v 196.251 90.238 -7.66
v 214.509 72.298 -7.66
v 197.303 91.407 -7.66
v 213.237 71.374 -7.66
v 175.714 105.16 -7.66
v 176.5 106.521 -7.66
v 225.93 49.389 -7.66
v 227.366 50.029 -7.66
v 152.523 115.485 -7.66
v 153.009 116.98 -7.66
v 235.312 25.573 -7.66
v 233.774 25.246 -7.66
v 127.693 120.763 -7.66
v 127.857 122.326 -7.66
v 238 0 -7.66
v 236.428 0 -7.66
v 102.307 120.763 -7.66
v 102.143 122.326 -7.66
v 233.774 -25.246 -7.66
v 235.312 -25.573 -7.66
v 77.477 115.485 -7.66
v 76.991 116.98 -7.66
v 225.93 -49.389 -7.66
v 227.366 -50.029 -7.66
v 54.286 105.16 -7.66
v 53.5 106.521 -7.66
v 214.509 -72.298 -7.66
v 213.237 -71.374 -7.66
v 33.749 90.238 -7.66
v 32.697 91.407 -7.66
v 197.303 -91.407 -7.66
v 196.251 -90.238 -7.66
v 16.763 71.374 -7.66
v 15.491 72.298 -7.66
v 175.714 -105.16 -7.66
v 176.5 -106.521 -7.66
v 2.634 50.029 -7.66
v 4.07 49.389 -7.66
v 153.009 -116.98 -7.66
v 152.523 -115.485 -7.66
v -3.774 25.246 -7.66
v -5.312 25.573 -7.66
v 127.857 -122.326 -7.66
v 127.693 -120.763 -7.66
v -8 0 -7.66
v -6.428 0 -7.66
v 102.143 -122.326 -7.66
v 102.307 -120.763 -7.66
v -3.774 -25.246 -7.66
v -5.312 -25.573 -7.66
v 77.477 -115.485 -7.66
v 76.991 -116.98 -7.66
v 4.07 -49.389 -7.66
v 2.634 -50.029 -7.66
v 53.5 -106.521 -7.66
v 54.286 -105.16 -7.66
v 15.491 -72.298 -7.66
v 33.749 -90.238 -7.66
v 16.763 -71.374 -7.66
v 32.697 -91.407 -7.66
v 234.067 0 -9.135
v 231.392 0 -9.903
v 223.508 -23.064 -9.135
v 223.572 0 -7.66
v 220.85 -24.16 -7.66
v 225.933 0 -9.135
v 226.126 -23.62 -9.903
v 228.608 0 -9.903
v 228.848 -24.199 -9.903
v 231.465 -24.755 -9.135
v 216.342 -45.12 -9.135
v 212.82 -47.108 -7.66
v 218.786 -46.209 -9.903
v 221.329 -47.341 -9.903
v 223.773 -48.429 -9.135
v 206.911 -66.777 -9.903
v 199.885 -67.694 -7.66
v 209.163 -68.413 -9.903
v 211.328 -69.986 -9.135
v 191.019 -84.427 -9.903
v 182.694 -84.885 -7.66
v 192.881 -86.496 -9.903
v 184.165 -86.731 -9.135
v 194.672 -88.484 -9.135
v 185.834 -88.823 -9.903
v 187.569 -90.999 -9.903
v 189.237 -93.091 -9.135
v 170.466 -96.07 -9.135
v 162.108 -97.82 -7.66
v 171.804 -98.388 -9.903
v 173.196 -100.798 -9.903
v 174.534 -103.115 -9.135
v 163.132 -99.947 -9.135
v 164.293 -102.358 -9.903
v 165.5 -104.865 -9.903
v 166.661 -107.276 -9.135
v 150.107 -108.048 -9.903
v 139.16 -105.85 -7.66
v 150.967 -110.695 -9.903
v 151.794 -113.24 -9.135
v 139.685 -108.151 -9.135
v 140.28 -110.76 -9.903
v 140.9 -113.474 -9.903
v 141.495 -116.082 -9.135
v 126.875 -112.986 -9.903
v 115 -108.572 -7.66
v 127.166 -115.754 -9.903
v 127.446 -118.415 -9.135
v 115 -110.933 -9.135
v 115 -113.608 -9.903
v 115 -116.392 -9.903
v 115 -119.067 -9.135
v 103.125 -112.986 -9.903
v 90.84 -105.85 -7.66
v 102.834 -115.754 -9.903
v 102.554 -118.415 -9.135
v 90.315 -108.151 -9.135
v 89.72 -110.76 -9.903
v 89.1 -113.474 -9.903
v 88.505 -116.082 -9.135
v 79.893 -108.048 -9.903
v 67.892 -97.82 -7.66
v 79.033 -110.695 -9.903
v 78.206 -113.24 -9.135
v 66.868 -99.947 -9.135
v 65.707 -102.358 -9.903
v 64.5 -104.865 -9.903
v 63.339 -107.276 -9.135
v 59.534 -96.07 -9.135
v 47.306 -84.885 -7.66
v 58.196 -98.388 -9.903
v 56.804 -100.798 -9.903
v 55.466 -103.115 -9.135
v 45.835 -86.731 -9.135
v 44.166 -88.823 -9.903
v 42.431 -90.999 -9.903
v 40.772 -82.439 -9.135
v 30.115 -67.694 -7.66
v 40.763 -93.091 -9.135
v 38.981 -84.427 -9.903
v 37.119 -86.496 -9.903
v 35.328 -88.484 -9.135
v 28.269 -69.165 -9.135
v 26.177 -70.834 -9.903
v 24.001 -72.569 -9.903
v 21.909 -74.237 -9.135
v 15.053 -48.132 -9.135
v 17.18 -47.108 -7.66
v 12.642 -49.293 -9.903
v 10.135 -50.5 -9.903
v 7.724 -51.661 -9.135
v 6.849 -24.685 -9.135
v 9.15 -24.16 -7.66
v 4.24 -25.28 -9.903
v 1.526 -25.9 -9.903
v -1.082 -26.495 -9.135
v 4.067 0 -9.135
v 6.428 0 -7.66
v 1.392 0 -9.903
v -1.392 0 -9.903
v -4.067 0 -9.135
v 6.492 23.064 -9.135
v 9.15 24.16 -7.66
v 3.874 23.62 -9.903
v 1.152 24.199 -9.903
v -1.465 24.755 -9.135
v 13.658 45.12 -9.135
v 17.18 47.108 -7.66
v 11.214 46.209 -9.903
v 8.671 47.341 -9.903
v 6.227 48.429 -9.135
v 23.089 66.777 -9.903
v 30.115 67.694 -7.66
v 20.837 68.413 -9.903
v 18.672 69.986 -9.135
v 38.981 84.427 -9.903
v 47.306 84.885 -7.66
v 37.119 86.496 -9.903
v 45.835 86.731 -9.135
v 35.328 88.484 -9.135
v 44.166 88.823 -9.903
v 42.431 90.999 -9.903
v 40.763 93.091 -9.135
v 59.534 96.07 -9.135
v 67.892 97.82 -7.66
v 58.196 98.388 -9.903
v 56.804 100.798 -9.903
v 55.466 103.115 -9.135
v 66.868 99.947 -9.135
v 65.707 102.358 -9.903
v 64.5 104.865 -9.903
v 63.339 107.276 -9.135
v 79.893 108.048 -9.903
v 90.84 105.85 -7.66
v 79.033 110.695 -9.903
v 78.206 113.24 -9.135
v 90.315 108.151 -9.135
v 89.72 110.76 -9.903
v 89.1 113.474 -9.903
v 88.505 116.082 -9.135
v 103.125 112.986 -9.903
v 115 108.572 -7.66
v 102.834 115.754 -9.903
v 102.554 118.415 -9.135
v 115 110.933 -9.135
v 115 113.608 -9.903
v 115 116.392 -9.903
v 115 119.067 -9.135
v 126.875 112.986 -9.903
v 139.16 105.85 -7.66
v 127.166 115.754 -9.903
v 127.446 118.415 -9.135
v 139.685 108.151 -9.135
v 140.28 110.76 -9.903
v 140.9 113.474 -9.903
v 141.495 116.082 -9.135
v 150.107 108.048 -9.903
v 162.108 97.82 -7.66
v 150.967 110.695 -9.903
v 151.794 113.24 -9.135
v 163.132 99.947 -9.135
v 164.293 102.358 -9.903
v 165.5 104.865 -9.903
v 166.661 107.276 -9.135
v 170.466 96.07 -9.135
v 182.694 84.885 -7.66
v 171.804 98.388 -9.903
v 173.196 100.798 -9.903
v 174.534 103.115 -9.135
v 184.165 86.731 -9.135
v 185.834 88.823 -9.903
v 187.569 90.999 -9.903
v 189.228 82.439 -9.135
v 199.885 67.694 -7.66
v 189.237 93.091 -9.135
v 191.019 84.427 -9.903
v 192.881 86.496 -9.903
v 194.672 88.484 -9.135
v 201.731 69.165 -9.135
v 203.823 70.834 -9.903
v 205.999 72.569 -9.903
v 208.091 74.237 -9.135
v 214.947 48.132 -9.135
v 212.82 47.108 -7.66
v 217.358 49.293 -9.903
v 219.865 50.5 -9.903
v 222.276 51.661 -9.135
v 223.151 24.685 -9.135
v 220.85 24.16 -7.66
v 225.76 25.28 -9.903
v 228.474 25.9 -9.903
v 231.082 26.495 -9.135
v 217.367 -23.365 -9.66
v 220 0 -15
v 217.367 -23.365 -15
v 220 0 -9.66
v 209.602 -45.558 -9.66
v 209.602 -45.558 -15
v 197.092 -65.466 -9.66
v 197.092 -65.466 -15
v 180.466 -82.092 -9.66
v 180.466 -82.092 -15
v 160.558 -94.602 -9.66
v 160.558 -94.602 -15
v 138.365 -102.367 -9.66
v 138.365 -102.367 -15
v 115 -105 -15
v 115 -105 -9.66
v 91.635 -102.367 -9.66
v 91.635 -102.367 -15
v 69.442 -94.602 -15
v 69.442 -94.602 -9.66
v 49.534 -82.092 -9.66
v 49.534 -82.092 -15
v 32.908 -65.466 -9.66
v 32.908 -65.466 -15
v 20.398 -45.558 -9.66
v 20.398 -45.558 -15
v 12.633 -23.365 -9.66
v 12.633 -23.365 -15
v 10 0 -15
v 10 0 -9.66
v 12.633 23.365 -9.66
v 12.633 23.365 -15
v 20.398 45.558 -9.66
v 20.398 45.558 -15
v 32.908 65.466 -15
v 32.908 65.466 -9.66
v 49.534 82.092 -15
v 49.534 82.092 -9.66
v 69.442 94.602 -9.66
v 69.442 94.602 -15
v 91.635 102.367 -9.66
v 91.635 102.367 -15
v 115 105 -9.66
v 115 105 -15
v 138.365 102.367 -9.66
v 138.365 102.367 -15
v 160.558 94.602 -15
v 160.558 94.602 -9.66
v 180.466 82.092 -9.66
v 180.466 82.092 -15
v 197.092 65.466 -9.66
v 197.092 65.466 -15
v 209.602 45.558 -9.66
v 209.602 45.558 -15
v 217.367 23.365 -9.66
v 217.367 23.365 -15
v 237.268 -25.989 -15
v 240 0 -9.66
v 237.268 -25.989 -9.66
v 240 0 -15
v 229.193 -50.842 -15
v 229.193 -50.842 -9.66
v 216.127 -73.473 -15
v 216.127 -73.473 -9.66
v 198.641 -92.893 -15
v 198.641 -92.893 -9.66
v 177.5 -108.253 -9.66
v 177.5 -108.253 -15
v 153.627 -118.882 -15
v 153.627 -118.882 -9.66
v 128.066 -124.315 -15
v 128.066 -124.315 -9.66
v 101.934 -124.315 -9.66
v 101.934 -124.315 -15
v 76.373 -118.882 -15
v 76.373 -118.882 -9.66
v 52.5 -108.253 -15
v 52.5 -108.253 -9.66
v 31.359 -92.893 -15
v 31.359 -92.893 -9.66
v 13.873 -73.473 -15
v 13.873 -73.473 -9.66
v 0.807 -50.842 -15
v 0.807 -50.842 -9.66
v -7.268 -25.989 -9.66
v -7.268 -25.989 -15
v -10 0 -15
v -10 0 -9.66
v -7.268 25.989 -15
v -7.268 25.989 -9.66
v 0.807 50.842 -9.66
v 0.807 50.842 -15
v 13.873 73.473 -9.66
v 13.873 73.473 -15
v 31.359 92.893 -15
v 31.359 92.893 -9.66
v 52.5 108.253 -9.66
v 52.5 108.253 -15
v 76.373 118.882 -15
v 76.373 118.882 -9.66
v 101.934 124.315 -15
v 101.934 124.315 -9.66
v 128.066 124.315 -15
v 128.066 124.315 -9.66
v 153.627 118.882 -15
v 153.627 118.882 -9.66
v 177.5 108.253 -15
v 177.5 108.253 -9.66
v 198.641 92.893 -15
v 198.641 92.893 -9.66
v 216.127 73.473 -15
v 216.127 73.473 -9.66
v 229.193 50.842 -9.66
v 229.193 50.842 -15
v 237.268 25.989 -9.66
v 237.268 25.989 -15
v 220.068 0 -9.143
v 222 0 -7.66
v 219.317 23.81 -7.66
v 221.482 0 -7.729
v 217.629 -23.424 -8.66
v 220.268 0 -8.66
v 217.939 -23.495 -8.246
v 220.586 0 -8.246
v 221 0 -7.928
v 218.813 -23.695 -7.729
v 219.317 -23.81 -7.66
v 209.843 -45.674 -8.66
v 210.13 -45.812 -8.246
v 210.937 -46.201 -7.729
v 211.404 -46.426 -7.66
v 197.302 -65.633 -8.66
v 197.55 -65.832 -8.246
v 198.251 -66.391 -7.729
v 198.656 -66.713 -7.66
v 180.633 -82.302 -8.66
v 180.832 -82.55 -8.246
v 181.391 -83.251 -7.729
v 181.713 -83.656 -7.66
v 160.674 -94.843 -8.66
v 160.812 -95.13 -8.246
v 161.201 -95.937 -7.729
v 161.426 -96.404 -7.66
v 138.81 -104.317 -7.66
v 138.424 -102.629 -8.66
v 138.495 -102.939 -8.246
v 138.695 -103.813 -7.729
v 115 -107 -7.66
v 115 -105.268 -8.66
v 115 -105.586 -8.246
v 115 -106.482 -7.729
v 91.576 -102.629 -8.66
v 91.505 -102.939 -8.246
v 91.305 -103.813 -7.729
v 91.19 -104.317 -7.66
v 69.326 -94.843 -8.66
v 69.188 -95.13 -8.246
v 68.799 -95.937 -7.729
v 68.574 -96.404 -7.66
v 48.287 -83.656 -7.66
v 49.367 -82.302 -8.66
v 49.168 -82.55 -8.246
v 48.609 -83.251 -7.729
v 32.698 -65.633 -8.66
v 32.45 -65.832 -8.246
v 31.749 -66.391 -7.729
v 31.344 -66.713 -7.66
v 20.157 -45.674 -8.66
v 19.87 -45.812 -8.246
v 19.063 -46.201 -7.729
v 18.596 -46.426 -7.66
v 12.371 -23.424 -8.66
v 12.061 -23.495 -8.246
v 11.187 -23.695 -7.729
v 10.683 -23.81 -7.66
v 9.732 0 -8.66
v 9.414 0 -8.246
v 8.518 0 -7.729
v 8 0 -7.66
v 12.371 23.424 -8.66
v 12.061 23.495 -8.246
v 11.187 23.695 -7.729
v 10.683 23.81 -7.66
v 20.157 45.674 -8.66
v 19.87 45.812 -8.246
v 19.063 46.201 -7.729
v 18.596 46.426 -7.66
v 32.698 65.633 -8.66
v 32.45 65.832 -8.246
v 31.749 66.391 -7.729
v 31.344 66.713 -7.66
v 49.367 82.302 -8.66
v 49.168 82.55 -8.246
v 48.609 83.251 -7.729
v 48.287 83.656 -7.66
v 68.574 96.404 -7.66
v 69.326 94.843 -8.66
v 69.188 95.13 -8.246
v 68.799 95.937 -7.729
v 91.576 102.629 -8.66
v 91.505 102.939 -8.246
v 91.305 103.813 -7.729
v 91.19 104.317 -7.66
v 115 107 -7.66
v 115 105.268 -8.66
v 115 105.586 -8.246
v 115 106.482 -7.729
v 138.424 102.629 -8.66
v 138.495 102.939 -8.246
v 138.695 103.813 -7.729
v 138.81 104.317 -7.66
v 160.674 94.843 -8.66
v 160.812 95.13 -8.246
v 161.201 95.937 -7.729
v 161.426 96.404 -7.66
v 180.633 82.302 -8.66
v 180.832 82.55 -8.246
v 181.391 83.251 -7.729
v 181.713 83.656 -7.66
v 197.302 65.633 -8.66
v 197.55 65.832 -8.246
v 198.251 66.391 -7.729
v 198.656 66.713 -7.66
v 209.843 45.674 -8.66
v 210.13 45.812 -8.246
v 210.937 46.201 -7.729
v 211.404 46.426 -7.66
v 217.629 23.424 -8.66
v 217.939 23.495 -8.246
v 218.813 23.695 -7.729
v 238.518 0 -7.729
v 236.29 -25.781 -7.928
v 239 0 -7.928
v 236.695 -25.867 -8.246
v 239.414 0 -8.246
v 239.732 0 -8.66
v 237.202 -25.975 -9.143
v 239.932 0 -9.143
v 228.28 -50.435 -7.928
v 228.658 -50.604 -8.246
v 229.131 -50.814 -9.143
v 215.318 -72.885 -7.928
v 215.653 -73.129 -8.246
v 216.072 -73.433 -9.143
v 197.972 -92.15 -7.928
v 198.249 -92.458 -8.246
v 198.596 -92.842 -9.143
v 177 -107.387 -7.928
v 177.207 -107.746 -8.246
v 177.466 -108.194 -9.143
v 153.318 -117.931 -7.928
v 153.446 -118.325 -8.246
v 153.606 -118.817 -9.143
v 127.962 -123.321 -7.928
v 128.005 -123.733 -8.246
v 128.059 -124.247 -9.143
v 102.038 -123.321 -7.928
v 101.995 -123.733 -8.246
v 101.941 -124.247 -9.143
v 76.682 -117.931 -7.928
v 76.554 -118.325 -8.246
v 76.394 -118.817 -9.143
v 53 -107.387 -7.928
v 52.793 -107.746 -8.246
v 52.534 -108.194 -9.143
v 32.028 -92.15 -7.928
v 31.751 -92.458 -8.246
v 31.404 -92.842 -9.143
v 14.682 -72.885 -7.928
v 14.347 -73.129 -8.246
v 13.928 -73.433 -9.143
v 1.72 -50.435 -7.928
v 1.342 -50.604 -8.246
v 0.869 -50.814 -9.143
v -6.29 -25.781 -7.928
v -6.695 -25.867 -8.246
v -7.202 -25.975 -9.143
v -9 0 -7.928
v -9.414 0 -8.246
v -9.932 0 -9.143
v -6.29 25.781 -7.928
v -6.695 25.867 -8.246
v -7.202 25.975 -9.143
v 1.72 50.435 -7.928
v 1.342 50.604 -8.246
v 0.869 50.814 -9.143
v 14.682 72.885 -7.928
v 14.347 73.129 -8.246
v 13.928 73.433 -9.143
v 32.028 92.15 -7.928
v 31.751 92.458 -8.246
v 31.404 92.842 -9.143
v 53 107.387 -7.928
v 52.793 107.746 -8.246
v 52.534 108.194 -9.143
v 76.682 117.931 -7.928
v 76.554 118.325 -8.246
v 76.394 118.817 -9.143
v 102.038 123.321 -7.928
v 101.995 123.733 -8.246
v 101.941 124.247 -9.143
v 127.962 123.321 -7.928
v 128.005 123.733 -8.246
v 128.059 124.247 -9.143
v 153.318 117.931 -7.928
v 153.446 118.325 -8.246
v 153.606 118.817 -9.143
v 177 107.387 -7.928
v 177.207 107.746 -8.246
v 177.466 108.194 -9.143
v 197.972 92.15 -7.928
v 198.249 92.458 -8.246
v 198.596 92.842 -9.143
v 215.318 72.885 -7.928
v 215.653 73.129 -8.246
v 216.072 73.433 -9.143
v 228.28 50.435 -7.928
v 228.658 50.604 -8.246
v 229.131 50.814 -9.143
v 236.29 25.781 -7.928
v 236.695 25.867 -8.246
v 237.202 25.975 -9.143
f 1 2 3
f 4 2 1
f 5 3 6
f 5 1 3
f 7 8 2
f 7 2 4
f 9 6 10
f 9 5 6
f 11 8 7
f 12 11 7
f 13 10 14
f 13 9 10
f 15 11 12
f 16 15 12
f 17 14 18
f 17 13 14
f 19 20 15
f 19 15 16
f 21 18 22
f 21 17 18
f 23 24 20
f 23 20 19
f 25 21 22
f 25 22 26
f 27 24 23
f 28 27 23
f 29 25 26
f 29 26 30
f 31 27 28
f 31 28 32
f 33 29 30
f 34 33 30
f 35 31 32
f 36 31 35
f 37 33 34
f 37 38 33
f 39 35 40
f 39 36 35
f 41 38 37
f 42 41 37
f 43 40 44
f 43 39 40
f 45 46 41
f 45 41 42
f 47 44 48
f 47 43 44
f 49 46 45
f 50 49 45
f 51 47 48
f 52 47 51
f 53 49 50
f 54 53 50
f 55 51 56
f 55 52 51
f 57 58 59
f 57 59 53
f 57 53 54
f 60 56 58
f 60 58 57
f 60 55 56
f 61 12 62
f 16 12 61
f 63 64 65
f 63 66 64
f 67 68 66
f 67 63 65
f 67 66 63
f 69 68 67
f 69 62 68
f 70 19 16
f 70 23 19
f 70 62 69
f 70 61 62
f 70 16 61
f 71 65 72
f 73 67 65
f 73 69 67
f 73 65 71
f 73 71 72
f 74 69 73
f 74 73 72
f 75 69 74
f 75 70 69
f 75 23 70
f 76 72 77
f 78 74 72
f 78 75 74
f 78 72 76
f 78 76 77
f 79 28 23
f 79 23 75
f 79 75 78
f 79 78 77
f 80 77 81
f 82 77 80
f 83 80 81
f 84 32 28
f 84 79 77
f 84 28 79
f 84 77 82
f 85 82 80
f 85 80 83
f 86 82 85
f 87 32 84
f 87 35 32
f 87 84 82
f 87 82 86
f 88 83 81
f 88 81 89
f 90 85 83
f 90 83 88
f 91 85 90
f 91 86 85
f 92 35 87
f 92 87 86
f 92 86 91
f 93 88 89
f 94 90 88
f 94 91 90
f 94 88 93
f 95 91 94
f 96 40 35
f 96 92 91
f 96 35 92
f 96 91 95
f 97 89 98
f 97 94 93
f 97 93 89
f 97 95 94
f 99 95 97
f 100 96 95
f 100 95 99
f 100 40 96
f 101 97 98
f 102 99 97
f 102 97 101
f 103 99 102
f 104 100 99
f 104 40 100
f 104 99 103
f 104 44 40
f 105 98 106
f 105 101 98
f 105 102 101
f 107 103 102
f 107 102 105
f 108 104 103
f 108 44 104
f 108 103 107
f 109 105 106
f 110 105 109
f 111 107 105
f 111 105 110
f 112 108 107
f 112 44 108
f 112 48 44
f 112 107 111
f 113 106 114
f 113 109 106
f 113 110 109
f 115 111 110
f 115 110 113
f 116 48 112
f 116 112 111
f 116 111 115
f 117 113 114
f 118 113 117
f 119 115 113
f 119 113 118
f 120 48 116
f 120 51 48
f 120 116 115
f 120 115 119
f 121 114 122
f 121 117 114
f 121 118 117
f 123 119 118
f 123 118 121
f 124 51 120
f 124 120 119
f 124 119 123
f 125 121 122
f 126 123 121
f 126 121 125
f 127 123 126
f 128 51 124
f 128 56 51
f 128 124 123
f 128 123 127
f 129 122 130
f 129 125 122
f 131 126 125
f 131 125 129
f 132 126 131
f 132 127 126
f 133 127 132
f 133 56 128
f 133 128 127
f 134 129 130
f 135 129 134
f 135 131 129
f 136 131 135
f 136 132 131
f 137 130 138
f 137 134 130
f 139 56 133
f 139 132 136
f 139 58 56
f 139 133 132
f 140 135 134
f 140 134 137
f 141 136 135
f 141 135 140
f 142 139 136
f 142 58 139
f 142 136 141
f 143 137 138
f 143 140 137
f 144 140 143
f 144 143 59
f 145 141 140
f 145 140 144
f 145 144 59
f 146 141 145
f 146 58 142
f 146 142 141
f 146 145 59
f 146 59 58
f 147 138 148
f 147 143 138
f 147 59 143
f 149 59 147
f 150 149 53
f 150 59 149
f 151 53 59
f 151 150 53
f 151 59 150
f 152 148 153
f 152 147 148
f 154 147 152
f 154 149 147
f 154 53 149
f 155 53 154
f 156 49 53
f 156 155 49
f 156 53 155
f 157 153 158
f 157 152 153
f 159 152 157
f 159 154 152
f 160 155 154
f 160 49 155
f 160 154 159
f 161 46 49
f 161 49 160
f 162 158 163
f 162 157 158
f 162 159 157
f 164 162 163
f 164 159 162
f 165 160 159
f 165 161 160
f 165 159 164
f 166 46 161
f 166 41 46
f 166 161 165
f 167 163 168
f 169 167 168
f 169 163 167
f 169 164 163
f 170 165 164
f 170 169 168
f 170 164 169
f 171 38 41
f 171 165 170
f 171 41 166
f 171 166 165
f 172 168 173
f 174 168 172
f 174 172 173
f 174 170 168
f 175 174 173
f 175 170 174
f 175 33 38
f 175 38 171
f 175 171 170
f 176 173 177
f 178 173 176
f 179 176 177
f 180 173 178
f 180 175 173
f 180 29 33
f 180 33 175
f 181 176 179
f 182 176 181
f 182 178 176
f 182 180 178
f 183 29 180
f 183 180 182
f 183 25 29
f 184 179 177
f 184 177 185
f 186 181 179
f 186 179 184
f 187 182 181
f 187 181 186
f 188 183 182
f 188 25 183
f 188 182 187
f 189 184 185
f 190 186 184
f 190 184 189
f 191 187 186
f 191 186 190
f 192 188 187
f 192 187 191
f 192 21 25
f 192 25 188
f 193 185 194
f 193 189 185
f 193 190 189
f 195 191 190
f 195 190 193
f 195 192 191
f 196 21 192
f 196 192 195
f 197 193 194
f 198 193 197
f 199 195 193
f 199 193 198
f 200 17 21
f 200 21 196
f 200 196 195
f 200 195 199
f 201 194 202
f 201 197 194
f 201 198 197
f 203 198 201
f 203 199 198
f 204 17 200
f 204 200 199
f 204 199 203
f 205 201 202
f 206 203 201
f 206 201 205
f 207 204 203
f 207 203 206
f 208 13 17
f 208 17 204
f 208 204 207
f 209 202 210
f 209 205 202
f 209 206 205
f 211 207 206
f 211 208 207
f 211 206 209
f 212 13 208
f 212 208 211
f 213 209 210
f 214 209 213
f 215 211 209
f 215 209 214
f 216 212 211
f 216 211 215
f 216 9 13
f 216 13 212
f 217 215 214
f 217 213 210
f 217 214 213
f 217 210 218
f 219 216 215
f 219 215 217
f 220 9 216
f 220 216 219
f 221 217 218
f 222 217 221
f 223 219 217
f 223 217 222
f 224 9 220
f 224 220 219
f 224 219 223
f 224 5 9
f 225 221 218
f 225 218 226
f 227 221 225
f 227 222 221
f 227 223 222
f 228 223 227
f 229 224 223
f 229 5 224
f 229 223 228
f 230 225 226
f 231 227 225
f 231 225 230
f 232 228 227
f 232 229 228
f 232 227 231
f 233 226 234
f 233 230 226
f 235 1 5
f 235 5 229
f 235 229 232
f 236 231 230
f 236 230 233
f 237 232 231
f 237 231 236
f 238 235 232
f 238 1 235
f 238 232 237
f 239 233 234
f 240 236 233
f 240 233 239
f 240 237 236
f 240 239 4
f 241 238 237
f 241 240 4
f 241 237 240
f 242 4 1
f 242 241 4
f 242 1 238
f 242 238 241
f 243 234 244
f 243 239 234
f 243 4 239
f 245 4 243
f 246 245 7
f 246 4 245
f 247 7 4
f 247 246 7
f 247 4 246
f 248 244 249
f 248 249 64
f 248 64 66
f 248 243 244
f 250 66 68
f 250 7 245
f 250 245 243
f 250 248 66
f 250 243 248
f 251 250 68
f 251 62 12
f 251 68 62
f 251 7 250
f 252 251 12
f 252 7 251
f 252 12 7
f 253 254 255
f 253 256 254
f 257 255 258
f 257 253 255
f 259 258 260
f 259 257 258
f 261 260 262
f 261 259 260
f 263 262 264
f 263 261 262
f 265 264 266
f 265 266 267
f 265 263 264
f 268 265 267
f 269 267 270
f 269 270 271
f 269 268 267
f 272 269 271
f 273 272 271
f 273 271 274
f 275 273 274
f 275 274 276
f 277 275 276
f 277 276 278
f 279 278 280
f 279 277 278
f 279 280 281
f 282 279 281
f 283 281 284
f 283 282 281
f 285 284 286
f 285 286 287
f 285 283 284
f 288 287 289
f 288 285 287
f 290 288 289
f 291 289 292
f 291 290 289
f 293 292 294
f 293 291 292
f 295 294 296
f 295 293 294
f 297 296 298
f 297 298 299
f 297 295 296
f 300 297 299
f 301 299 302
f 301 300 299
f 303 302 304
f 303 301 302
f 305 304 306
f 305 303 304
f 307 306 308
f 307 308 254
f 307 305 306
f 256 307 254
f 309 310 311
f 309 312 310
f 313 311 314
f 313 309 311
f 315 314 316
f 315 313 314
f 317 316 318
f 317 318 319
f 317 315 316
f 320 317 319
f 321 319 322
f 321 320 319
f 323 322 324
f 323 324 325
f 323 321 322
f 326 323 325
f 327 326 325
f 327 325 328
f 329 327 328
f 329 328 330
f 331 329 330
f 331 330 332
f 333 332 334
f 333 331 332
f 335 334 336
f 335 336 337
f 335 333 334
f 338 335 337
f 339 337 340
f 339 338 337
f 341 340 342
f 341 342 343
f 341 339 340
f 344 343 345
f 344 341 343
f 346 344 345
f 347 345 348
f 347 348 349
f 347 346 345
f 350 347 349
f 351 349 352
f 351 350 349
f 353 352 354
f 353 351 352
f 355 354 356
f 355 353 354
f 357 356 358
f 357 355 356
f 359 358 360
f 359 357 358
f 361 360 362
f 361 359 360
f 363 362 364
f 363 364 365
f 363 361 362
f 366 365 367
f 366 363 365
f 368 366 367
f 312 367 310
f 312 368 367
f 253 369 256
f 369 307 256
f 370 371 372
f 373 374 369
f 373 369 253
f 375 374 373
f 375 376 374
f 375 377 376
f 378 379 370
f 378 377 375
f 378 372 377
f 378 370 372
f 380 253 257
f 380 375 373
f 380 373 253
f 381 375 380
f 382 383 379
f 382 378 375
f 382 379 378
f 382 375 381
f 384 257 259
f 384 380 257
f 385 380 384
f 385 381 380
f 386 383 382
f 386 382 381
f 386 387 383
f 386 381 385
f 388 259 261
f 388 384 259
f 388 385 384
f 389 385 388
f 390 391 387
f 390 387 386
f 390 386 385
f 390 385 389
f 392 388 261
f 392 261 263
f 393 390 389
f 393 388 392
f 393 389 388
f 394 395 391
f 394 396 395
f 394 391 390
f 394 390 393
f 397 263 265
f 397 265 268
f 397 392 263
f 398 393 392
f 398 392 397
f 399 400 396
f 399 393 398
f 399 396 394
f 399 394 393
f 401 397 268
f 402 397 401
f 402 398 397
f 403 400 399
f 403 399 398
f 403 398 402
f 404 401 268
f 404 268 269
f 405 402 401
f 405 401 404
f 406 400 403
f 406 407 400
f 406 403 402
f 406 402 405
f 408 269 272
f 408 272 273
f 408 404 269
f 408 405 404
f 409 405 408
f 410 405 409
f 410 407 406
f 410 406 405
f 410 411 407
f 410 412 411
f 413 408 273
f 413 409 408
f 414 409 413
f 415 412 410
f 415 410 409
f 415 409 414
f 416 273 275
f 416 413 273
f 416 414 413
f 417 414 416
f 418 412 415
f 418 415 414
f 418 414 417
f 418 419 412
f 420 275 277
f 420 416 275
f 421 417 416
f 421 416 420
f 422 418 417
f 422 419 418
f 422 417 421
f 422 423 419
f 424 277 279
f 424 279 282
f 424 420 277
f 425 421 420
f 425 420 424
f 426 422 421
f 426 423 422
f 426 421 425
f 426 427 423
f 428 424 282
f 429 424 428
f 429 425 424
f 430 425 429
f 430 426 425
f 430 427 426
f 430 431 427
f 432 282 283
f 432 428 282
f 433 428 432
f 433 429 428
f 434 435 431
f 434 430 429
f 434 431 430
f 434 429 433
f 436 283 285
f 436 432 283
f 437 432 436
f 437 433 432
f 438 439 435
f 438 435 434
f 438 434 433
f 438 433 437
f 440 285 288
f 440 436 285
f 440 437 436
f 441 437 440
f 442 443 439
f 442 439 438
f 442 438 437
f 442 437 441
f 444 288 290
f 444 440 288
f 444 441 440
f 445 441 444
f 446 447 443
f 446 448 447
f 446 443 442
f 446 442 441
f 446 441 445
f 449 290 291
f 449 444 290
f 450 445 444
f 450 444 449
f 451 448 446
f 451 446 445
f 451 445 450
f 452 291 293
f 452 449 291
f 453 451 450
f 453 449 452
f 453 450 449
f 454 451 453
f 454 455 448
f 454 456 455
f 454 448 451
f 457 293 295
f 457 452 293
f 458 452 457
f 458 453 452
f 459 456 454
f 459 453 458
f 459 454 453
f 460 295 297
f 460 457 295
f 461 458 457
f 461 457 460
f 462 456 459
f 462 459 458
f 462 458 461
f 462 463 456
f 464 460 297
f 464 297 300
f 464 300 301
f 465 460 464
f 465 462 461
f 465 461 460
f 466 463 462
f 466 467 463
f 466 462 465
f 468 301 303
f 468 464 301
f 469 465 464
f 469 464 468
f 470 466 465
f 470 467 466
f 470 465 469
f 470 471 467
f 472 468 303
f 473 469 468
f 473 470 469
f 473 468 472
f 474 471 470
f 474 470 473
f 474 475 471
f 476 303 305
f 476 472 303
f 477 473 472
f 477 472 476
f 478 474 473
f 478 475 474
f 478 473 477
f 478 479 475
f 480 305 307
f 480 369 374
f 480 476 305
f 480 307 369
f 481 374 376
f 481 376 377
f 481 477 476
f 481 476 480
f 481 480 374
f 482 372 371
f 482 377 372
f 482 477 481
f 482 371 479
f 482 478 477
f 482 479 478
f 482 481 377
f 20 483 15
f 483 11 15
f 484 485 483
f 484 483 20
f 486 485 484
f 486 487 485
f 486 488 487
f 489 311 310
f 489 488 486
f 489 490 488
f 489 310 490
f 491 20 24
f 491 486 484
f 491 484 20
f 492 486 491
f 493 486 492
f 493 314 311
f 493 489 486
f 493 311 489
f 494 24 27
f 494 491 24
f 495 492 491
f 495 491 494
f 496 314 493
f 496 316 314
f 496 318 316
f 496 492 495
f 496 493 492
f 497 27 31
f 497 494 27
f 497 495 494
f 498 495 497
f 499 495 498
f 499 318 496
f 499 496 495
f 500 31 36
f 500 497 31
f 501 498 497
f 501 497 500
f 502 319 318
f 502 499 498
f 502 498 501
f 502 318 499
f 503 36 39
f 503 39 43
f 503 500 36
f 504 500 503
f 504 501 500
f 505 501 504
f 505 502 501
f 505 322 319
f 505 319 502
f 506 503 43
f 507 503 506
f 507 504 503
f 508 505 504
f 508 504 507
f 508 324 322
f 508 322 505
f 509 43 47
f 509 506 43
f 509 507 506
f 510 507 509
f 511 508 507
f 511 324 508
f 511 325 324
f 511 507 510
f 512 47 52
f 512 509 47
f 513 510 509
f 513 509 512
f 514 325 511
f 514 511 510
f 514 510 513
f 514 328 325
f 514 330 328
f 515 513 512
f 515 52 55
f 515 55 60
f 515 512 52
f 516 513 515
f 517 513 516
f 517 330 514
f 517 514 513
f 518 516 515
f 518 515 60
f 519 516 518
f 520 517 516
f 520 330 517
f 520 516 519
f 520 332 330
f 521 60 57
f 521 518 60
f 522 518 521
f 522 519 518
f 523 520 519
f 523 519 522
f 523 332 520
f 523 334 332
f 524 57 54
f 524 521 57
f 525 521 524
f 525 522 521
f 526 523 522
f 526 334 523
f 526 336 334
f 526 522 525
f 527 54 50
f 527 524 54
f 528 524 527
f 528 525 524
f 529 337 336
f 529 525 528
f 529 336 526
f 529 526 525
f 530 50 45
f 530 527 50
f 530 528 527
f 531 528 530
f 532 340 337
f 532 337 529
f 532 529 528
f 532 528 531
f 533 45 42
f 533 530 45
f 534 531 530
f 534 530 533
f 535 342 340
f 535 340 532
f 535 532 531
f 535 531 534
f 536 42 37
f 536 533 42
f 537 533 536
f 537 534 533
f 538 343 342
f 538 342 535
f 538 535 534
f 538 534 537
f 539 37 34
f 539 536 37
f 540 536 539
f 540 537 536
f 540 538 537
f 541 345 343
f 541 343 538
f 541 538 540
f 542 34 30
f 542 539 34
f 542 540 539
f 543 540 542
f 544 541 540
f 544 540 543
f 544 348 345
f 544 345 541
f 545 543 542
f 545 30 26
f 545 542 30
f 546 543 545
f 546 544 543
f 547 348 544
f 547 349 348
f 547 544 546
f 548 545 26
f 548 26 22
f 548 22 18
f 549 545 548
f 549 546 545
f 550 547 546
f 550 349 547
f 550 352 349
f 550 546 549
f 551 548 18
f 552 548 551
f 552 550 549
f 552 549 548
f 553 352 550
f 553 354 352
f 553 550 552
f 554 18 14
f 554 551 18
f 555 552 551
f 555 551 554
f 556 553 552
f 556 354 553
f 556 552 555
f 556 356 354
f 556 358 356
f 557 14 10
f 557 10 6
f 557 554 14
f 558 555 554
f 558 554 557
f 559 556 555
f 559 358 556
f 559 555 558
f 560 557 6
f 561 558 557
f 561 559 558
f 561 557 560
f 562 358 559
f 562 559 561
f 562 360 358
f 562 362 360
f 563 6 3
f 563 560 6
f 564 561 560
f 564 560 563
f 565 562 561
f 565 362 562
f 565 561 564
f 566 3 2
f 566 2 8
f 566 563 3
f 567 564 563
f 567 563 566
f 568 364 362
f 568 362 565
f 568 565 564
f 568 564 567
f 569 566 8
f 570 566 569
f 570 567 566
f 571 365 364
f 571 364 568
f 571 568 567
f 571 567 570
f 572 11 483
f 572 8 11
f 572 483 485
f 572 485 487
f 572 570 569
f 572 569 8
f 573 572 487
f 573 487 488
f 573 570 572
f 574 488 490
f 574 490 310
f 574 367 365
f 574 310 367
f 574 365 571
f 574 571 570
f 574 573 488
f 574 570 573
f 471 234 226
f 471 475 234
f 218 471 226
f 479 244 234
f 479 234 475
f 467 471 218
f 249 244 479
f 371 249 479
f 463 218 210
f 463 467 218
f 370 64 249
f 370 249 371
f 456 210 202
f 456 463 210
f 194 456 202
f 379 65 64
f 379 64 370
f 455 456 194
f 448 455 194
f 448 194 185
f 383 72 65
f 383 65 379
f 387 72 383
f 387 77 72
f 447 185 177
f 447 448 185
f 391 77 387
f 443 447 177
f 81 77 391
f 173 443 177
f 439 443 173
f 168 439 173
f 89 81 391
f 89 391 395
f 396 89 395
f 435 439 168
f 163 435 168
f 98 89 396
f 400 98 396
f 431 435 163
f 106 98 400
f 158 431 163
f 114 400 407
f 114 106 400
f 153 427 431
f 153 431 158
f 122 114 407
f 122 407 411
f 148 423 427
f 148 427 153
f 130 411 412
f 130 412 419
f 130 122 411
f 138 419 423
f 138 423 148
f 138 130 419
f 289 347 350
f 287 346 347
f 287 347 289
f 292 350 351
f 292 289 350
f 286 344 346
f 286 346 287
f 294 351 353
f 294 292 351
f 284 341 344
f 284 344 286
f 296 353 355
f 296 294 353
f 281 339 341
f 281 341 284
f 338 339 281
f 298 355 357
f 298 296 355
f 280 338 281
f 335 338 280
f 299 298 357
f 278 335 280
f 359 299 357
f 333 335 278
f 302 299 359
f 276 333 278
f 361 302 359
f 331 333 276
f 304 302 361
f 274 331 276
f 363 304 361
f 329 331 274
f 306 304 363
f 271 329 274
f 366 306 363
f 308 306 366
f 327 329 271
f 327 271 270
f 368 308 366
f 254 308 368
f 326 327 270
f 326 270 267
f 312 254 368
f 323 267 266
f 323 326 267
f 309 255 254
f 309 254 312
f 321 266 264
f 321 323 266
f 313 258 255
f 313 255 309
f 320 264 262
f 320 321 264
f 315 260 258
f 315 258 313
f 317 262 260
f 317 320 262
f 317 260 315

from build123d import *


with BuildPart() as part:
    # 草圖3 → 旋轉2 (revolve)
    with BuildSketch(Plane(origin=(0, 0, 0), x_dir=(1, 0, 0), z_dir=(0, 1, 0))):
        with BuildLine():
            Line((-10, 15), (10, 15))
            Line((10, 15), (10, 9.660444431))
            ThreePointArc((10, 9.660444431), (9.414213562, 8.246230869), (8, 7.660444431))
            Line((8, 7.660444431), (6.427876097, 7.660444431))
            ThreePointArc((6.427876097, 7.660444431), (0, 10), (-6.427876097, 7.660444431))
            Line((-6.427876097, 7.660444431), (-8, 7.660444431))
            ThreePointArc((-8, 7.660444431), (-9.414213562, 8.246230869), (-10, 9.660444431))
            Line((-10, 9.660444431), (-10, 15))
        make_face()
    revolve(axis=Axis((115, 0, 57.074015866), (0, 0, -1)))


solid = part.part
